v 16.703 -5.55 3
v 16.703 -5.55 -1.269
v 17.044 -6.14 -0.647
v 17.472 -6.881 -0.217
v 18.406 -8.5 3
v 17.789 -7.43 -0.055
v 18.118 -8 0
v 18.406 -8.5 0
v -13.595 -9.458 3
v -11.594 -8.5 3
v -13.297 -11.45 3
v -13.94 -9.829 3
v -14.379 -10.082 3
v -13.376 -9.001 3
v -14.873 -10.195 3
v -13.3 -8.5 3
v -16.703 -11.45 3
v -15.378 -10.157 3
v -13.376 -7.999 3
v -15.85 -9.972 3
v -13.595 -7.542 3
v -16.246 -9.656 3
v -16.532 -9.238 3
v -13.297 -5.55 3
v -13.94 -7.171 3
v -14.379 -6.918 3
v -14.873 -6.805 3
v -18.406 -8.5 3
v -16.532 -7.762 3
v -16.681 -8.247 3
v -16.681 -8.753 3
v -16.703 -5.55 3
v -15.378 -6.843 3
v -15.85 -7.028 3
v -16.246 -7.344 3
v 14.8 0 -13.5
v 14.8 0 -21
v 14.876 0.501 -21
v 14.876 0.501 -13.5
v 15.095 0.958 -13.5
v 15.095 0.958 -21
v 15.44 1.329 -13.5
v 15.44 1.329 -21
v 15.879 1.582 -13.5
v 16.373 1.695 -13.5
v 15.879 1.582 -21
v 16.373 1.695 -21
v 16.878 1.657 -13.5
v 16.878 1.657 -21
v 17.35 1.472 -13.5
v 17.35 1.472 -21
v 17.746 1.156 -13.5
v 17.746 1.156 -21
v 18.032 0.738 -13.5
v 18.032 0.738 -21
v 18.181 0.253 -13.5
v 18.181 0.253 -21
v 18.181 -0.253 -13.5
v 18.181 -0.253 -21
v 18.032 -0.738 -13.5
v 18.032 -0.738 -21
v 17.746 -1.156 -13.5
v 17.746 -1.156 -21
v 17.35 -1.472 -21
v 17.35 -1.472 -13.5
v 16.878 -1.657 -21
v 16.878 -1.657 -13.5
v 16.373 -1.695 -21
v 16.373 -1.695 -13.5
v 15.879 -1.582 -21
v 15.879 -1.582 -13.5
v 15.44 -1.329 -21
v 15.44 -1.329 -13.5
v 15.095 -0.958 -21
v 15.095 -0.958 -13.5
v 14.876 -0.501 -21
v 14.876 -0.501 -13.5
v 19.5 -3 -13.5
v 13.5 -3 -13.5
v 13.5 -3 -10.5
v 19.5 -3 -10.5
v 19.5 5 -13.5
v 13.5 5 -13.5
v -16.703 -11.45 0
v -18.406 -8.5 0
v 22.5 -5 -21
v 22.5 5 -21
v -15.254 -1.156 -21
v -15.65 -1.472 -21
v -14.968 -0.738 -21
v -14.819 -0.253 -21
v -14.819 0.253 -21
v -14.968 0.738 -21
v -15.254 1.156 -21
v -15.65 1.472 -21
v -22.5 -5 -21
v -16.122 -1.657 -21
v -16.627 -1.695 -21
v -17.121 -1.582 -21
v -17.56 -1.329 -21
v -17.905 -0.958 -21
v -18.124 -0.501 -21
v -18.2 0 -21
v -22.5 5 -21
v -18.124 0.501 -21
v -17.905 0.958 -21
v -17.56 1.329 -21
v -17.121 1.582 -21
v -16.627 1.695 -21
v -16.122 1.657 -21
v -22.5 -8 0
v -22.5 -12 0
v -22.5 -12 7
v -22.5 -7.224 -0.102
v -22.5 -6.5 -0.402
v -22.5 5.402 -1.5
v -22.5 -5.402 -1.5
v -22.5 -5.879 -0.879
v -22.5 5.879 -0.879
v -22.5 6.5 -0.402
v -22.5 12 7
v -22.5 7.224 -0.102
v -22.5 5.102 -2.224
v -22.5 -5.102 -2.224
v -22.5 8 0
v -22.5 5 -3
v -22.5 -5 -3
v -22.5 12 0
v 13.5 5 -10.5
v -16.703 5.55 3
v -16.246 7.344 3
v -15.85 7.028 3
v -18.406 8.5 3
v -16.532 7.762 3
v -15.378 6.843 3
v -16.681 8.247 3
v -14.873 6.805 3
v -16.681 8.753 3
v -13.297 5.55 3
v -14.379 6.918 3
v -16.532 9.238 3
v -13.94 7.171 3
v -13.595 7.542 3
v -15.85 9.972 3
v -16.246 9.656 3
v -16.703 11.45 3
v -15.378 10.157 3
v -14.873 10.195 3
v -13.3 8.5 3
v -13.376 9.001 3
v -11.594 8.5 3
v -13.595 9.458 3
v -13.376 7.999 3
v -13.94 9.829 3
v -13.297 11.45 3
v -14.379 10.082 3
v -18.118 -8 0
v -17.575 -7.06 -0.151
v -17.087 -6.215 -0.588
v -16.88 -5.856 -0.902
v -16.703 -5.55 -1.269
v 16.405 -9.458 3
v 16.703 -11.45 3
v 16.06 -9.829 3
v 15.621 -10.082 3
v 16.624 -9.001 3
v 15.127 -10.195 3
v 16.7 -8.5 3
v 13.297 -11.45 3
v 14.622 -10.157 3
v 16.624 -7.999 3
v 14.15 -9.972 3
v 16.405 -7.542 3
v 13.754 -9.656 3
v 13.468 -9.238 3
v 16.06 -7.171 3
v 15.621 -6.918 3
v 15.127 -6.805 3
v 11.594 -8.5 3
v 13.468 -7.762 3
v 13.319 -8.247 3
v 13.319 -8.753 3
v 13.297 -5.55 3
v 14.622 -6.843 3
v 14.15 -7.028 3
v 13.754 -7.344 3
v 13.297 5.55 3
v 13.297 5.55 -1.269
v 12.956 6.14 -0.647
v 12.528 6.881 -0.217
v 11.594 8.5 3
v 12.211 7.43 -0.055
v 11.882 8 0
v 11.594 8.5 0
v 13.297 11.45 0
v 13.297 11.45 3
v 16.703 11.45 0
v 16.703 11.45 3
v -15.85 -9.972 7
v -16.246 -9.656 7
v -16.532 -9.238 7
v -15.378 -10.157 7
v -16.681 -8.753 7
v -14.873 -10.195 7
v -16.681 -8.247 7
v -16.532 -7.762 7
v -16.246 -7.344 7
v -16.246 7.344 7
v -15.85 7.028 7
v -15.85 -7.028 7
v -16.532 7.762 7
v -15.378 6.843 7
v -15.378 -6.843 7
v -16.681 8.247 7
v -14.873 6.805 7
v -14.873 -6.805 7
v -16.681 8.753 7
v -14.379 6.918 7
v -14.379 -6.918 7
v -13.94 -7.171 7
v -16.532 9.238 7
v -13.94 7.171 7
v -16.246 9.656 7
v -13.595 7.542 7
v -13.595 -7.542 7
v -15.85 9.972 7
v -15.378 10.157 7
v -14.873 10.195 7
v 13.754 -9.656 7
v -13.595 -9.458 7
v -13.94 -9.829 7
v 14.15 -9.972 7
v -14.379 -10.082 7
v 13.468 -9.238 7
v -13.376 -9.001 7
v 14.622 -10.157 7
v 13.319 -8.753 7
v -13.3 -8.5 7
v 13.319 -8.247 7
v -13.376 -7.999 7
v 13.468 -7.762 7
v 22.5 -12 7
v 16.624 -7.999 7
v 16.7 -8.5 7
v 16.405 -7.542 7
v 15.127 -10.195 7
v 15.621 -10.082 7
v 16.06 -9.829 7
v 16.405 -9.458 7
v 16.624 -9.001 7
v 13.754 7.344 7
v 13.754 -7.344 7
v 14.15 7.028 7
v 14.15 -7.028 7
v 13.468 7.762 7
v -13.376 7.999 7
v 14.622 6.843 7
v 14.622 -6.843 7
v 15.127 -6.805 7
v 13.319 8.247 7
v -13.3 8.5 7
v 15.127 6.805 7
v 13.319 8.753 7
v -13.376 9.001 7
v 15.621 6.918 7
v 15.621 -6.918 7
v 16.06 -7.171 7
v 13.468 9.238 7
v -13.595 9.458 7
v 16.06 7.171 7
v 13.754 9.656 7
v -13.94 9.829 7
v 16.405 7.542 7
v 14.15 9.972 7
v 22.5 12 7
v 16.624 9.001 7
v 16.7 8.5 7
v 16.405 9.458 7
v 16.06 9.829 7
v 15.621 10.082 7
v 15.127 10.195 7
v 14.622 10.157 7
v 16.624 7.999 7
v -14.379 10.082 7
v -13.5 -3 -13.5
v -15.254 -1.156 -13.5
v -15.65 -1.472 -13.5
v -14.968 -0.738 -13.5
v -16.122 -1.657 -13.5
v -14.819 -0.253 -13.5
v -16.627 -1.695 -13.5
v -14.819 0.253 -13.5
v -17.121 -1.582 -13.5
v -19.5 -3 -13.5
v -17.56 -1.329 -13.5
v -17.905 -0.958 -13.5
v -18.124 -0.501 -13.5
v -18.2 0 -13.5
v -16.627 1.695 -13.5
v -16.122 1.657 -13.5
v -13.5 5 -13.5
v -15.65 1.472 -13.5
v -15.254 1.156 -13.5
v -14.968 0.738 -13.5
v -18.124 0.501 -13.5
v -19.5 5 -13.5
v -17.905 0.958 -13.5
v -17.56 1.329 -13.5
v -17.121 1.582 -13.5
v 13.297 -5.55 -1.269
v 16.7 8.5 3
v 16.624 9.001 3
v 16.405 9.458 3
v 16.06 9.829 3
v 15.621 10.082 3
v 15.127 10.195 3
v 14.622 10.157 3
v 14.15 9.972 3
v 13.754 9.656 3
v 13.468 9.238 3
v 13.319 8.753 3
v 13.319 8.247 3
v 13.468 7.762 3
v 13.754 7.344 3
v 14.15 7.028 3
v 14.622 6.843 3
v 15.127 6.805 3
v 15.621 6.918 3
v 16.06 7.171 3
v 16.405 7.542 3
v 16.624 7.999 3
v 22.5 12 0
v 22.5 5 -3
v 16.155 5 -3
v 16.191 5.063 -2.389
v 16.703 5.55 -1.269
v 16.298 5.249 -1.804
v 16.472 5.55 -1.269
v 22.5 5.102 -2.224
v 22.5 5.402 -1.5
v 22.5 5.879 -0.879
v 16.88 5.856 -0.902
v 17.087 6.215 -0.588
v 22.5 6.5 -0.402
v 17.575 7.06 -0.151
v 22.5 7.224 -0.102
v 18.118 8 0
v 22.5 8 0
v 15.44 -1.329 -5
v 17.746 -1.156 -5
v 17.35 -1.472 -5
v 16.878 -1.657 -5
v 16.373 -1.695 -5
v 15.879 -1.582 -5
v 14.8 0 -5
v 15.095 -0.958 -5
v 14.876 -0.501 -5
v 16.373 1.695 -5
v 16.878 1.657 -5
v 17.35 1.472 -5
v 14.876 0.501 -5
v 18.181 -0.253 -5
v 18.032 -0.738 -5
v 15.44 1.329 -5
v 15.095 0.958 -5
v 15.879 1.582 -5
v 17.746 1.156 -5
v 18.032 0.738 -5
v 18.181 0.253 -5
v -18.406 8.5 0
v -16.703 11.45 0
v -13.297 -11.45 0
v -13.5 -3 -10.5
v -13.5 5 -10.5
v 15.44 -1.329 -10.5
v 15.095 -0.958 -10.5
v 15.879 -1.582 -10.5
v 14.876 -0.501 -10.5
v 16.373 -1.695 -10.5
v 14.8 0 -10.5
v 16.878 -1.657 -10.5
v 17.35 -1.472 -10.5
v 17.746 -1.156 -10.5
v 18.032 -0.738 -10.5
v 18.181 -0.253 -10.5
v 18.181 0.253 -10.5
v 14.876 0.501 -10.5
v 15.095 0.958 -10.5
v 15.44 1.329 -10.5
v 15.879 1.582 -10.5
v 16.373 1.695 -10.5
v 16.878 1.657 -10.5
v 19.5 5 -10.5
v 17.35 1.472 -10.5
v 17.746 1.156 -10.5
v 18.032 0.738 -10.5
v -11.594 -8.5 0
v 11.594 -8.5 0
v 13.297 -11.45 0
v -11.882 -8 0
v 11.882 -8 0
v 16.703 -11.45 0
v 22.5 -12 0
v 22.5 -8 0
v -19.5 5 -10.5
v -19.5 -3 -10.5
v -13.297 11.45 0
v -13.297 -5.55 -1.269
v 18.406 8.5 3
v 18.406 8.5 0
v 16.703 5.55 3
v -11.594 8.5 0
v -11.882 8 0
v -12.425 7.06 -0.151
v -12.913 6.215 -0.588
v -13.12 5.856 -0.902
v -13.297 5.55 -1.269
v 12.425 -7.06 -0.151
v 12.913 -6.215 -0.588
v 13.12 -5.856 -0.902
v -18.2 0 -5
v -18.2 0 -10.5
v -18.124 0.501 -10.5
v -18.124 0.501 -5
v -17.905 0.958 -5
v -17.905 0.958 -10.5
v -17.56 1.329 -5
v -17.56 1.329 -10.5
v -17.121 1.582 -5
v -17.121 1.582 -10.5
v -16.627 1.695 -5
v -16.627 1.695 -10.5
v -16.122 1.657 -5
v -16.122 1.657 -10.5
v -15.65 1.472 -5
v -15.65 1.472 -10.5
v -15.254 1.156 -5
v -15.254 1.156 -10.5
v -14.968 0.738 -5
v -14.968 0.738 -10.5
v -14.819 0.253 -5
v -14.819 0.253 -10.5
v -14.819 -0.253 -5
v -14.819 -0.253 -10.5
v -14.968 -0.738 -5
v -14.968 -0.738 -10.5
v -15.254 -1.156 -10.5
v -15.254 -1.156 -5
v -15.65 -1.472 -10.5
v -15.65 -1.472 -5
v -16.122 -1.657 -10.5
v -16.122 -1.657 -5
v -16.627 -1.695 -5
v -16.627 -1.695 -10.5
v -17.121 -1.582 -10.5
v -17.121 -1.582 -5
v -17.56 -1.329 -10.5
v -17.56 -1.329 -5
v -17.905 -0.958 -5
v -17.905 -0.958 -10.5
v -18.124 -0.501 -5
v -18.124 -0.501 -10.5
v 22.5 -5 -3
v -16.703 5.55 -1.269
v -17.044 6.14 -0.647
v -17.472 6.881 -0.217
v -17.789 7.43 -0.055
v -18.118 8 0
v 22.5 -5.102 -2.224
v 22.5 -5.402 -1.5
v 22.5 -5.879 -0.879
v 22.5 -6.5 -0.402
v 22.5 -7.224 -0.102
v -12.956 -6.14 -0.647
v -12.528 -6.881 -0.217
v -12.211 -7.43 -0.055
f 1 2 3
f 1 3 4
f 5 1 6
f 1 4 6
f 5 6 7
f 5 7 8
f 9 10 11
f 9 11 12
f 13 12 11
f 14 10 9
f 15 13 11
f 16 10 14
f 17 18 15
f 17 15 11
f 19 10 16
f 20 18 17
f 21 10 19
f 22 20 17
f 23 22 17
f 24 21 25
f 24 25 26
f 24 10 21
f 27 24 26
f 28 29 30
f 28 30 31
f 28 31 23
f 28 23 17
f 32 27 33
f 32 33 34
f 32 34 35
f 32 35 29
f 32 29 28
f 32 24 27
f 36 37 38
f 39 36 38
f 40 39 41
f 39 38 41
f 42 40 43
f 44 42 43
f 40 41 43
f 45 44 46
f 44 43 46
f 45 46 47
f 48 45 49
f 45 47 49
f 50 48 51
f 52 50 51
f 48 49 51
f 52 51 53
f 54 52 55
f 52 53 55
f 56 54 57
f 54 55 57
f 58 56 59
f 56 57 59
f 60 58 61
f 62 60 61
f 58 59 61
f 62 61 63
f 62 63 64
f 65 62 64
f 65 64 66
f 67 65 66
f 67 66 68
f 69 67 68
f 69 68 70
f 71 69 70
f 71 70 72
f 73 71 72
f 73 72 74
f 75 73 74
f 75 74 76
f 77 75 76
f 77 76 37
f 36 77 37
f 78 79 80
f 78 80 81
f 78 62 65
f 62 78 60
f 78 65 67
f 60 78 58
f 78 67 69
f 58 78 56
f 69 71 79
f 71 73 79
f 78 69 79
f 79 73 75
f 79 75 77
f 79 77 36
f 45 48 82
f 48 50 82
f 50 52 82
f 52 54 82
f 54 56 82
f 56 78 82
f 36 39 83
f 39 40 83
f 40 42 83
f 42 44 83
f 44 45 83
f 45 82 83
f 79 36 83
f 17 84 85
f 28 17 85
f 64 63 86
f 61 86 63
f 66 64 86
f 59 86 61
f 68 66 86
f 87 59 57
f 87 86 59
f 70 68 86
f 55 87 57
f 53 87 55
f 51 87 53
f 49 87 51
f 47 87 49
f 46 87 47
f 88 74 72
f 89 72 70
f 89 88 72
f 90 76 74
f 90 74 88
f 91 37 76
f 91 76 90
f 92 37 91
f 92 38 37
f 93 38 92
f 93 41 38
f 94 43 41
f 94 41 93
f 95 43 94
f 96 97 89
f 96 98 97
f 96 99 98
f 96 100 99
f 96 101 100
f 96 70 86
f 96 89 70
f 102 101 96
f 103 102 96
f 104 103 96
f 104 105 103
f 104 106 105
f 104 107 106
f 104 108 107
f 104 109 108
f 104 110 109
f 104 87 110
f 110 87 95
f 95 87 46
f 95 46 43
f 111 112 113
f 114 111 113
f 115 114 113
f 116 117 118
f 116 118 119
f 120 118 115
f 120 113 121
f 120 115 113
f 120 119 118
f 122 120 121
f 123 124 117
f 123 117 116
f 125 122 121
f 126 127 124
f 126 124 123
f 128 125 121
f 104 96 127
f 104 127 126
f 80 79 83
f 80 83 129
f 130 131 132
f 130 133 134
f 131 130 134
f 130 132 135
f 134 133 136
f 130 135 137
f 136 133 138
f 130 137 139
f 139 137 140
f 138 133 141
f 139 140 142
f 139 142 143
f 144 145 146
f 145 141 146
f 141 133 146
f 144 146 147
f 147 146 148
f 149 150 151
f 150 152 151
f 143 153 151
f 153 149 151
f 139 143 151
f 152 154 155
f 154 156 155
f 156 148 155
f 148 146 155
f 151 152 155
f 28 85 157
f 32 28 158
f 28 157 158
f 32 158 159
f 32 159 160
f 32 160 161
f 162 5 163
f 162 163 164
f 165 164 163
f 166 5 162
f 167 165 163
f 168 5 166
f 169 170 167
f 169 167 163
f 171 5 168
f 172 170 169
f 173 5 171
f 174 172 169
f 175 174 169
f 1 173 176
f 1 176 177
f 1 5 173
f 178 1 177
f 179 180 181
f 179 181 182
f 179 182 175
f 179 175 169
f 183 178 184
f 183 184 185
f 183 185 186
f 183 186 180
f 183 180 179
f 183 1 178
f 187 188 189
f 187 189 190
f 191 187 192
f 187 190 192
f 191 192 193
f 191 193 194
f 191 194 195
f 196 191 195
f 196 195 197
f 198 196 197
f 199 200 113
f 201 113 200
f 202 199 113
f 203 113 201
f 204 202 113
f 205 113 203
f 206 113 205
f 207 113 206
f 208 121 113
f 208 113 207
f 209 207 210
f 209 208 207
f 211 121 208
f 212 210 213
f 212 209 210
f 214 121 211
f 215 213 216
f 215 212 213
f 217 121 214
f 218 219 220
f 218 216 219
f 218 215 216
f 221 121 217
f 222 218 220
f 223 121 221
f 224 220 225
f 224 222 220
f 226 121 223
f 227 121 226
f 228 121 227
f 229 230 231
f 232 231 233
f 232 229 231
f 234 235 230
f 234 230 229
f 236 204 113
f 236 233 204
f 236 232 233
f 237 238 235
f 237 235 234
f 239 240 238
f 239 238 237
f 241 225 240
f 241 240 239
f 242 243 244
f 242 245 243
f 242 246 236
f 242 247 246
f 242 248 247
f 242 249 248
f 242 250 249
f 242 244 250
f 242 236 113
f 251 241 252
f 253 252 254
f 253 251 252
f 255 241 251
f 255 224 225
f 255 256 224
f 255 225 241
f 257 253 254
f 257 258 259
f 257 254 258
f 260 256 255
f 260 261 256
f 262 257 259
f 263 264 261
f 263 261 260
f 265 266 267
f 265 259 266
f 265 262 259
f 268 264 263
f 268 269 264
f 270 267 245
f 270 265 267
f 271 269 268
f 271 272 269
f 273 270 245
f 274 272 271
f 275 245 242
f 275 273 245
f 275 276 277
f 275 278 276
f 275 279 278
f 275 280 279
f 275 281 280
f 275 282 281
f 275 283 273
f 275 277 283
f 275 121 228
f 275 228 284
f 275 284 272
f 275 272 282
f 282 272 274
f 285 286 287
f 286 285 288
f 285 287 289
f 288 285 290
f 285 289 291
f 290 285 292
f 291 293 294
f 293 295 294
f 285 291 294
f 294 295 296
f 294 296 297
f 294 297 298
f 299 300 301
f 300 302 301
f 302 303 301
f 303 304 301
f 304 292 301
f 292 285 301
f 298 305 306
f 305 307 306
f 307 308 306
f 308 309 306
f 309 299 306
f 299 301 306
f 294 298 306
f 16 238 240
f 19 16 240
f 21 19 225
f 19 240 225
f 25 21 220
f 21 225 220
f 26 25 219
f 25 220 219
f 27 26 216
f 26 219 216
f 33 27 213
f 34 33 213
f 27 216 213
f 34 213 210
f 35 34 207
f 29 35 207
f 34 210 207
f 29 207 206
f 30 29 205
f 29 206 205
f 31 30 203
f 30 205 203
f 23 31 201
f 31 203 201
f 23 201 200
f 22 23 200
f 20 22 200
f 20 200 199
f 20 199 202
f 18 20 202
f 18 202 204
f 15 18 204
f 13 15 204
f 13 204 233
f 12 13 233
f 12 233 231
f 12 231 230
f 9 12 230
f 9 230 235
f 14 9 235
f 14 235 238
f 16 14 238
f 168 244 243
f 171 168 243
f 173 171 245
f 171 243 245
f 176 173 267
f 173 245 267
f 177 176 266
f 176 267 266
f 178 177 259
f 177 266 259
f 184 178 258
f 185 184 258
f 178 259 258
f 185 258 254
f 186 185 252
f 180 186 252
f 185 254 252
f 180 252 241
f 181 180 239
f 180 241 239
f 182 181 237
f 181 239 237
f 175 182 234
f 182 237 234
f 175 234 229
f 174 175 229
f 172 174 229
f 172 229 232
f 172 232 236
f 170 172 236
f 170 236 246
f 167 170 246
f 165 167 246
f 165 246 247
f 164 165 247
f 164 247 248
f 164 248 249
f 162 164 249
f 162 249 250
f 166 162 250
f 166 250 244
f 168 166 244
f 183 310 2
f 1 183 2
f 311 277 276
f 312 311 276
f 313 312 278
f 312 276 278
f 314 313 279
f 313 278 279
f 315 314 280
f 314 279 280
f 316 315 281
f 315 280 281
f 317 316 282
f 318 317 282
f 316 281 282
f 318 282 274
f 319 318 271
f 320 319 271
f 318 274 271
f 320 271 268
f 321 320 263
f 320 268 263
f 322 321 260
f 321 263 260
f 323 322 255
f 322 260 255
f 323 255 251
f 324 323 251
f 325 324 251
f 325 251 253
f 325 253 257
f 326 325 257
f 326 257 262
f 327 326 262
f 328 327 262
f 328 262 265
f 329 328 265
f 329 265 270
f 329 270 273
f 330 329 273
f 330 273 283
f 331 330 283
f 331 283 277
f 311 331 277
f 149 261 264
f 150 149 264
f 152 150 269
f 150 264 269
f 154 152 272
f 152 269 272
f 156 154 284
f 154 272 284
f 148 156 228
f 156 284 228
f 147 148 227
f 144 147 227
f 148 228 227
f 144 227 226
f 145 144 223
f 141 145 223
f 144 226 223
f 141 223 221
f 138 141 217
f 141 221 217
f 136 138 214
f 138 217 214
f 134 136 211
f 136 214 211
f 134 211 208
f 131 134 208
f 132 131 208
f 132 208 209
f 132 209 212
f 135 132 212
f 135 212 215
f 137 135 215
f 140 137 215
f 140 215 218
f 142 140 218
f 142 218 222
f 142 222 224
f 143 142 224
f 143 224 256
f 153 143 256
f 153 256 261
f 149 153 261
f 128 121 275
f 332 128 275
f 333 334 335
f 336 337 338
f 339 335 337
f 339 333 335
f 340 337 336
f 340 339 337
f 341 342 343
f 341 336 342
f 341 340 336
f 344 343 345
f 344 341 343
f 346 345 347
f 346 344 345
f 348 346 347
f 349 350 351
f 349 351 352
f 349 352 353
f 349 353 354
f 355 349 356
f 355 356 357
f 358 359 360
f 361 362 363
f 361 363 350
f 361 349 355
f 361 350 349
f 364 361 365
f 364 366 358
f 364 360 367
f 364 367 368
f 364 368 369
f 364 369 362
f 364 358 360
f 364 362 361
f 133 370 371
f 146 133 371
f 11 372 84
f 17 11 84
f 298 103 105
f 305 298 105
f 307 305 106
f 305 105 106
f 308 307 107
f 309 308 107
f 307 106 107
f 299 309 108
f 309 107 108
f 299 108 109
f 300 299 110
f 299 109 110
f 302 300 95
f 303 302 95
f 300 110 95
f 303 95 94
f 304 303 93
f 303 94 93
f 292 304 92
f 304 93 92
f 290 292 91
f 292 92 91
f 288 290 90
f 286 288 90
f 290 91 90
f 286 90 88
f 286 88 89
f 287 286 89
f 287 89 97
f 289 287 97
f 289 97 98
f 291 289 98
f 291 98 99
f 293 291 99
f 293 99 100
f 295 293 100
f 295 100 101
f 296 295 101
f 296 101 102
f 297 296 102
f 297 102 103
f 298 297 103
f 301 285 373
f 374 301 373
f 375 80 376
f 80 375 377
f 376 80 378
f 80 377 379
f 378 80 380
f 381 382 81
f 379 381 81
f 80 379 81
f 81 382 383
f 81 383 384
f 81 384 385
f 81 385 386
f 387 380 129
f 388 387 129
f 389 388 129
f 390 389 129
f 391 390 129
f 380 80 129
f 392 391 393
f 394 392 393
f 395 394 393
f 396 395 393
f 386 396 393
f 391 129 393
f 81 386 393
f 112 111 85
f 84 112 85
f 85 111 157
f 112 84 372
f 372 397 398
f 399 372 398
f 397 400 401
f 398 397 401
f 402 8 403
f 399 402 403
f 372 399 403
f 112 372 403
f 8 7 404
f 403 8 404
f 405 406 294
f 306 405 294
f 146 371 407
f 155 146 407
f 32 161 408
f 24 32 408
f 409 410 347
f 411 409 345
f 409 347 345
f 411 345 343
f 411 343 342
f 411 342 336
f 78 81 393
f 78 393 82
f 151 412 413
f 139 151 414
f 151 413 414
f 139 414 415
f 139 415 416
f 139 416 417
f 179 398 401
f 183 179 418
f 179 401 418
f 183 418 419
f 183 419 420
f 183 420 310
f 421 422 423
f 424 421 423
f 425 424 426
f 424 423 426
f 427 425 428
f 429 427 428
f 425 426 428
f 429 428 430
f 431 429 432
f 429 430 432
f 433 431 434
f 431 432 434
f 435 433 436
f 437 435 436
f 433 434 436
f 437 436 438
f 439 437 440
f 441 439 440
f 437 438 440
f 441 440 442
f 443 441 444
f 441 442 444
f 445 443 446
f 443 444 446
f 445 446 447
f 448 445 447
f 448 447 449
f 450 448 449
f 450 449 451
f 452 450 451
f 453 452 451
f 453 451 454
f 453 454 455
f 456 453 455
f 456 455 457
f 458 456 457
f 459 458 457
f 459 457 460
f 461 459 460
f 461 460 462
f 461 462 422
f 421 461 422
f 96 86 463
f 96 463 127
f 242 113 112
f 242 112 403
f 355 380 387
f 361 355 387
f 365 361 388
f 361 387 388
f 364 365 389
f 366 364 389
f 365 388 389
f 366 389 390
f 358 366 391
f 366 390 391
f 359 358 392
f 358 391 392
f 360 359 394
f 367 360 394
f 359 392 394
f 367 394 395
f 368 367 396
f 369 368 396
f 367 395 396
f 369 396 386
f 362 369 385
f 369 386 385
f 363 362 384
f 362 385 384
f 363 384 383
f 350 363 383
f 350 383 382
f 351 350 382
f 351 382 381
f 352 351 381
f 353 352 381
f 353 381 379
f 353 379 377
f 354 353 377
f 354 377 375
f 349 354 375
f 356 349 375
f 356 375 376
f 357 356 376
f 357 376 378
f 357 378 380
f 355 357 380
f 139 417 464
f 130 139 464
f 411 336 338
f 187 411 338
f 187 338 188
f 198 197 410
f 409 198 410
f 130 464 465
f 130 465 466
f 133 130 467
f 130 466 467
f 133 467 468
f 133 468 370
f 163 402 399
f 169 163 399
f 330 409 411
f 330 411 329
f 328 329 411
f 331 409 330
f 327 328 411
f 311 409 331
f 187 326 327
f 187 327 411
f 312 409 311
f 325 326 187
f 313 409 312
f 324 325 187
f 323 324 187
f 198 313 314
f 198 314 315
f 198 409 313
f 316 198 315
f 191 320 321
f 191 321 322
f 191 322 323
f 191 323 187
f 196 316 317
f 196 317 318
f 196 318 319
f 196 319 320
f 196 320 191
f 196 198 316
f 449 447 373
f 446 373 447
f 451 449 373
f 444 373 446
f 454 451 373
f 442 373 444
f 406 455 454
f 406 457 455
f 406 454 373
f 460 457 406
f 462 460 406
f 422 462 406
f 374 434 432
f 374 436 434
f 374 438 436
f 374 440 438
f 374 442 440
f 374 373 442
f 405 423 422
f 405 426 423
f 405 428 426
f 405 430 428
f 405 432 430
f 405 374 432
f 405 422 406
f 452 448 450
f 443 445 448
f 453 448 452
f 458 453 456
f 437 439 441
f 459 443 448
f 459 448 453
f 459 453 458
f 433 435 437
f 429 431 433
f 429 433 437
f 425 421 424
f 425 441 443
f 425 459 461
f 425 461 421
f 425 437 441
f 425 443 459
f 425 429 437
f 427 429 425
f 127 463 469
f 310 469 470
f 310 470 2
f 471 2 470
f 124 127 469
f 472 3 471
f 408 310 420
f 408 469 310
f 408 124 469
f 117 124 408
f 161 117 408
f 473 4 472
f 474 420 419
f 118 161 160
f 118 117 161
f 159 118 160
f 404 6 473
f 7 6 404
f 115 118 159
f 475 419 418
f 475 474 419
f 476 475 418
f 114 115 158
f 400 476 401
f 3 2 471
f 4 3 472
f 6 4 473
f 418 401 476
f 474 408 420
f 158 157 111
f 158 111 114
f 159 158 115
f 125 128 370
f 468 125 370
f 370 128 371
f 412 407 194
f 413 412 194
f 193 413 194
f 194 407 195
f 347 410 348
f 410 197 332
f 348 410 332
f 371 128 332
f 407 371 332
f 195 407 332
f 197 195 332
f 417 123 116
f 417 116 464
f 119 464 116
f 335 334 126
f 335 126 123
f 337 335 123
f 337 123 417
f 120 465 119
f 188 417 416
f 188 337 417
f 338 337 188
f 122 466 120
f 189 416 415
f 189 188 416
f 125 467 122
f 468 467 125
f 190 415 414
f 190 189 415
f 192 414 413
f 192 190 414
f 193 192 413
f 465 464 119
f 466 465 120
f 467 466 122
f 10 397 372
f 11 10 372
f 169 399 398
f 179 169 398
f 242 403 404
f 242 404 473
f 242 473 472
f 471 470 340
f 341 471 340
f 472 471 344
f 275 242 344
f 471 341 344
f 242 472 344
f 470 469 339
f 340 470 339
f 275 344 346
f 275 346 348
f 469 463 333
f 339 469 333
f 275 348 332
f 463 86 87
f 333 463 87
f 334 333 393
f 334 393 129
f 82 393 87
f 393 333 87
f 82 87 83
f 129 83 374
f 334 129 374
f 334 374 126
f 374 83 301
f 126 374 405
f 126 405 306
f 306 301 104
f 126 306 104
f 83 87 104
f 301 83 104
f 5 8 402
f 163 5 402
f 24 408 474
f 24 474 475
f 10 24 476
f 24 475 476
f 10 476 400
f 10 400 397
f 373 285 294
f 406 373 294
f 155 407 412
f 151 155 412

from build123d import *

# Parameters (mm, degrees)
SKETCH_1_W          = 45
SKETCH_1_H          = 20
EXTRUDE_1_DEPTH     = 10
EXTRUDE_2_DEPTH     = 17
SKETCH_3_W          = 45
SKETCH_3_H          = 2
EXTRUDE_3_DEPTH     = 10
SKETCH_5_R          = 1.5
CUT_EXTRUDE_1_DEPTH = 31.647185841
CUT_EXTRUDE_3_DEPTH = 3
FILLET_4_R          = 3
FILLET_5_R          = 3
SKETCH_9_W          = 45
SKETCH_9_H          = 24
CUT_EXTRUDE_4_DEPTH = 3
SKETCH_10_W         = 45
SKETCH_10_H         = 10
EXTRUDE_4_DEPTH     = 3
SKETCH_12_R         = 1.55
CUT_EXTRUDE_5_DEPTH = 15
CUT_EXTRUDE_6_DEPTH = 8
EXTRUDE_START       = 1
SKETCH_15_W         = 45
SKETCH_15_H         = 10
SKETCH_15_R         = 1.55
EXTRUDE_5_DEPTH     = 1
SKETCH_16_R         = 1.7
CUT_EXTRUDE_7_DEPTH = 38.871493237
CUT_EXTRUDE_8_DEPTH = 24
CUT_EXTRUDE_9_REACH = 39.871
SKETCH_18_R         = 1.7


with BuildPart() as part:
    # Эскиз1 → Бобышка-Вытянуть1 (new body)
    with BuildSketch(Plane.XY):
        Rectangle(SKETCH_1_W, SKETCH_1_H)
    extrude(amount=EXTRUDE_1_DEPTH)

    # Эскиз2 → Бобышка-Вытянуть2 (add)
    with BuildSketch(Plane(origin=(0, 0, 0), x_dir=(-1, 0, 0), z_dir=(0, 0, -1))):
        Polygon((-22.5, 0), (-22.5, 5), (22.5, 5), (22.5, -5), (-22.5, -5), align=None)
    extrude(amount=EXTRUDE_2_DEPTH)

    # Эскиз3 → Бобышка-Вытянуть3 (add)
    with BuildSketch(Plane.XY.offset(10)):
        with Locations((0, 11)):
            Rectangle(SKETCH_3_W, SKETCH_3_H)
        with Locations((0, -11)):
            Rectangle(SKETCH_3_W, SKETCH_3_H)
    extrude(amount=-EXTRUDE_3_DEPTH)

    # Эскиз5 → Вырез-Вытянуть1 (cut, through all)
    with BuildSketch(Plane(origin=(0, 0, 0), x_dir=(-1, 0, 0), z_dir=(0, 0, -1))):
        with Locations((-15, 8.5)):
            Circle(SKETCH_5_R)
        with Locations((15, 8.5)):
            Circle(SKETCH_5_R)
        with Locations((15, -8.5)):
            Circle(SKETCH_5_R)
        with Locations((-15, -8.5)):
            Circle(SKETCH_5_R)
    extrude(amount=-CUT_EXTRUDE_1_DEPTH, mode=Mode.SUBTRACT)

    # Эскиз8 → Вырез-Вытянуть3 (cut)
    with BuildSketch(Plane(origin=(0, 0, 0), x_dir=(-1, 0, 0), z_dir=(0, 0, -1))):
        Polygon((-11.824573519, 8.5), (-13.41228676, 11.25), (-16.58771324, 11.25), (-18.175426481, 8.5), (-16.58771324, 5.75), (-13.41228676, 5.75), align=None)
        Polygon((-13.41228676, -5.75), (-11.824573519, -8.5), (-13.41228676, -11.25), (-16.58771324, -11.25), (-18.175426481, -8.5), (-16.58771324, -5.75), align=None)
        Polygon((11.824573519, -8.5), (13.41228676, -11.25), (16.58771324, -11.25), (18.175426481, -8.5), (16.58771324, -5.75), (13.41228676, -5.75), align=None)
        Polygon((13.41228676, 5.75), (11.824573519, 8.5), (13.41228676, 11.25), (16.58771324, 11.25), (18.175426481, 8.5), (16.58771324, 5.75), align=None)
    extrude(amount=-CUT_EXTRUDE_3_DEPTH, mode=Mode.SUBTRACT)

    # Скругление4
    # the kernel refuses this fillet: 3 mm, written as the material it adds along each edge
    with BuildSketch(Plane(origin=(22.5, 5, 0), x_dir=(0, 1, 0), z_dir=(-1, 0, 0))) as fillet_4_piece_1_section:
        with BuildLine():
            CenterArc((FILLET_4_R, FILLET_4_R), FILLET_4_R, 180, 90)
            Line((0, FILLET_4_R), (0, 0))
            Line((0, 0), (FILLET_4_R, 0))
        make_face()
    fillet_4_piece_1 = extrude(amount=52.5, mode=Mode.PRIVATE)
    fillet_4_piece_1 = split(fillet_4_piece_1, bisect_by=Plane(origin=(17.590792641, 7.487384486, -0.29904688), z_dir=(0.866025403784439, -0.49999999999999944, 0)), keep=Keep.TOP, mode=Mode.PRIVATE)
    add(fillet_4_piece_1)
    with BuildSketch(Plane(origin=(30, 5, 0), x_dir=(0, 1, 0), z_dir=(-1, 0, 0))) as fillet_4_piece_2_section:
        with BuildLine():
            CenterArc((FILLET_4_R, FILLET_4_R), FILLET_4_R, 180, 90)
            Line((0, FILLET_4_R), (0, 0))
            Line((0, 0), (FILLET_4_R, 0))
        make_face()
    fillet_4_piece_2 = extrude(amount=52.5, mode=Mode.PRIVATE)
    fillet_4_piece_2 = split(fillet_4_piece_2, bisect_by=Plane(origin=(16.011289033, 4.751603986, -0.863215568), z_dir=(-0.866025403784439, 0.49999999999999944, 0)), keep=Keep.TOP, mode=Mode.PRIVATE)
    fillet_4_piece_2 = split(fillet_4_piece_2, bisect_by=Plane(origin=(15, 5.75, -0.863215568), z_dir=(0, -1, 0)), keep=Keep.TOP, mode=Mode.PRIVATE)
    add(fillet_4_piece_2)
    with BuildSketch(Plane(origin=(30, 5, 0), x_dir=(0, 1, 0), z_dir=(-1, 0, 0))) as fillet_4_piece_3_section:
        with BuildLine():
            CenterArc((FILLET_4_R, FILLET_4_R), FILLET_4_R, 180, 90)
            Line((0, FILLET_4_R), (0, 0))
            Line((0, 0), (FILLET_4_R, 0))
        make_face()
    fillet_4_piece_3 = extrude(amount=60, mode=Mode.PRIVATE)
    fillet_4_piece_3 = split(fillet_4_piece_3, bisect_by=Plane(origin=(9.828179478, 11.957855912, -0.295719997), z_dir=(-0.8660254037844385, -0.5000000000000003, 0)), keep=Keep.TOP, mode=Mode.PRIVATE)
    fillet_4_piece_3 = split(fillet_4_piece_3, bisect_by=Plane(origin=(-9.828179478, 11.957855912, -0.295719997), z_dir=(0.8660254037844385, -0.5000000000000003, 0)), keep=Keep.TOP, mode=Mode.PRIVATE)
    add(fillet_4_piece_3)
    with BuildSketch(Plane(origin=(30, 5, 0), x_dir=(0, 1, 0), z_dir=(-1, 0, 0))) as fillet_4_piece_4_section:
        with BuildLine():
            CenterArc((FILLET_4_R, FILLET_4_R), FILLET_4_R, 180, 90)
            Line((0, FILLET_4_R), (0, 0))
            Line((0, 0), (FILLET_4_R, 0))
        make_face()
    fillet_4_piece_4 = extrude(amount=52.5, mode=Mode.PRIVATE)
    fillet_4_piece_4 = split(fillet_4_piece_4, bisect_by=Plane(origin=(-17.590792641, 7.487384486, -0.29904688), z_dir=(-0.866025403784439, -0.49999999999999944, 0)), keep=Keep.TOP, mode=Mode.PRIVATE)
    add(fillet_4_piece_4)

    # Скругление5
    # the kernel refuses this fillet: 3 mm, written as the material it adds along each edge
    with BuildSketch(Plane(origin=(-22.5, -5, 0), x_dir=(0, 0, -1), z_dir=(1, 0, 0))) as fillet_5_piece_1_section:
        with BuildLine():
            CenterArc((FILLET_5_R, -FILLET_5_R), FILLET_5_R, 90, 90)
            Line((0, -FILLET_5_R), (0, 0))
            Line((0, 0), (FILLET_5_R, 0))
        make_face()
    fillet_5_piece_1 = extrude(amount=45, mode=Mode.PRIVATE)
    fillet_5_piece_1 = split(fillet_5_piece_1, bisect_by=Plane(origin=(-19.417241341, -5.75, -0.889716038), z_dir=(0, 1, 0)), keep=Keep.TOP, mode=Mode.PRIVATE)
    add(fillet_5_piece_1)
    with BuildSketch(Plane(origin=(-22.5, -5, 0), x_dir=(0, 0, -1), z_dir=(1, 0, 0))) as fillet_5_piece_2_section:
        with BuildLine():
            CenterArc((FILLET_5_R, -FILLET_5_R), FILLET_5_R, 90, 90)
            Line((0, -FILLET_5_R), (0, 0))
            Line((0, 0), (FILLET_5_R, 0))
        make_face()
    fillet_5_piece_2 = extrude(amount=52.5, mode=Mode.PRIVATE)
    fillet_5_piece_2 = split(fillet_5_piece_2, bisect_by=Plane(origin=(-17.590792641, -7.487384486, -0.29904688), z_dir=(-0.866025403784439, 0.49999999999999944, 0)), keep=Keep.TOP, mode=Mode.PRIVATE)
    add(fillet_5_piece_2)
    with BuildSketch(Plane(origin=(-30, -5, 0), x_dir=(0, 0, -1), z_dir=(1, 0, 0))) as fillet_5_piece_3_section:
        with BuildLine():
            CenterArc((FILLET_5_R, -FILLET_5_R), FILLET_5_R, 90, 90)
            Line((0, -FILLET_5_R), (0, 0))
            Line((0, 0), (FILLET_5_R, 0))
        make_face()
    fillet_5_piece_3 = extrude(amount=60, mode=Mode.PRIVATE)
    fillet_5_piece_3 = split(fillet_5_piece_3, bisect_by=Plane(origin=(-9.828179478, -11.957855912, -0.295719997), z_dir=(0.8660254037844385, 0.5000000000000003, 0)), keep=Keep.TOP, mode=Mode.PRIVATE)
    fillet_5_piece_3 = split(fillet_5_piece_3, bisect_by=Plane(origin=(9.828179478, -11.957855912, -0.295719997), z_dir=(-0.8660254037844385, 0.5000000000000003, 0)), keep=Keep.TOP, mode=Mode.PRIVATE)
    add(fillet_5_piece_3)
    with BuildSketch(Plane(origin=(-30, -5, 0), x_dir=(0, 0, -1), z_dir=(1, 0, 0))) as fillet_5_piece_4_section:
        with BuildLine():
            CenterArc((FILLET_5_R, -FILLET_5_R), FILLET_5_R, 90, 90)
            Line((0, -FILLET_5_R), (0, 0))
            Line((0, 0), (FILLET_5_R, 0))
        make_face()
    fillet_5_piece_4 = extrude(amount=52.5, mode=Mode.PRIVATE)
    fillet_5_piece_4 = split(fillet_5_piece_4, bisect_by=Plane(origin=(17.590792641, -7.487384486, -0.29904688), z_dir=(0.866025403784439, 0.49999999999999944, 0)), keep=Keep.TOP, mode=Mode.PRIVATE)
    add(fillet_5_piece_4)

    # Эскиз9 → Вырез-Вытянуть4 (cut)
    with BuildSketch(Plane.XY.offset(10)):
        Rectangle(SKETCH_9_W, SKETCH_9_H)
    extrude(amount=-CUT_EXTRUDE_4_DEPTH, mode=Mode.SUBTRACT)

    # Эскиз10 → Бобышка-Вытянуть4 (add)
    with BuildSketch(Plane(origin=(0, 0, -17), x_dir=(-1, 0, 0), z_dir=(0, 0, -1))):
        Rectangle(SKETCH_10_W, SKETCH_10_H)
    extrude(amount=EXTRUDE_4_DEPTH)

    # Эскиз12 → Вырез-Вытянуть5 (cut)
    with BuildSketch(Plane(origin=(0, 0, -20), x_dir=(-1, 0, 0), z_dir=(0, 0, -1))):
        with Locations((-16.5, 0)):
            Circle(SKETCH_12_R)
        with Locations((16.5, 0)):
            Circle(SKETCH_12_R)
    extrude(amount=-CUT_EXTRUDE_5_DEPTH, mode=Mode.SUBTRACT)

    # Эскиз13 → Вырез-Вытянуть6 (cut)
    with BuildSketch(Plane(origin=(0, 5, 0), x_dir=(1, 0, 0), z_dir=(0, 1, 0))):
        Polygon((16.5, 13.5), (13.5, 13.5), (13.5, 10.5), (19.5, 10.5), (19.5, 13.5), align=None)
        Polygon((-19.5, 13.5), (-16.5, 13.5), (-13.5, 13.5), (-13.5, 10.5), (-19.5, 10.5), align=None)
    extrude(amount=-CUT_EXTRUDE_6_DEPTH, mode=Mode.SUBTRACT)

    # Эскиз15 → Бобышка-Вытянуть5 (add)
    with BuildSketch(Plane(origin=(0, 0, -20), x_dir=(-1, 0, 0), z_dir=(0, 0, -1)).offset(EXTRUDE_START)):
        Rectangle(SKETCH_15_W, SKETCH_15_H)
        with Locations((-16.5, 0)):
            Circle(SKETCH_15_R, mode=Mode.SUBTRACT)
        with Locations((16.5, 0)):
            Circle(SKETCH_15_R, mode=Mode.SUBTRACT)
    extrude(amount=-EXTRUDE_5_DEPTH)

    # Эскиз16 → Вырез-Вытянуть7 (cut, through all)
    with BuildSketch(Plane.XY.offset(7)):
        with Locations((15, -8.5)):
            Circle(SKETCH_16_R)
        with Locations((-15, -8.5)):
            Circle(SKETCH_16_R)
        with Locations((-15, 8.5)):
            Circle(SKETCH_16_R)
        with Locations((15, 8.5)):
            Circle(SKETCH_16_R)
    extrude(amount=-CUT_EXTRUDE_7_DEPTH, mode=Mode.SUBTRACT)

    # Эскиз17 → Вырез-Вытянуть8 (cut)
    with BuildSketch(Plane(origin=(0, 0, -21), x_dir=(-1, 0, 0), z_dir=(0, 0, -1))):
        Polygon((-13.296816706, 5.55), (-11.593633412, 8.5), (-13.296816706, 11.45), (-16.703183294, 11.45), (-18.406366588, 8.5), (-16.703183294, 5.55), align=None)
        Polygon((16.703183294, 5.55), (18.406366588, 8.5), (16.703183294, 11.45), (13.296816706, 11.45), (11.593633412, 8.5), (13.296816706, 5.55), align=None)
        Polygon((16.703183294, -11.45), (18.406366588, -8.5), (16.703183294, -5.55), (13.296816706, -5.55), (11.593633412, -8.5), (13.296816706, -11.45), align=None)
        Polygon((-13.296816706, -11.45), (-11.593633412, -8.5), (-13.296816706, -5.55), (-16.703183294, -5.55), (-18.406366588, -8.5), (-16.703183294, -11.45), align=None)
    extrude(amount=-CUT_EXTRUDE_8_DEPTH, mode=Mode.SUBTRACT)

    # Вырез-Вытянуть9: up to this face of the body (flat: up to its plane)
    cut_extrude_9_end = Plane(part.part.faces().sort_by_distance((16.5, 0, -5))[0])
    # Эскиз18 → Вырез-Вытянуть9 (cut, up to the picked face)
    with BuildSketch(Plane(origin=(0, 0, -21), x_dir=(-1, 0, 0), z_dir=(0, 0, -1)), mode=Mode.PRIVATE) as cut_extrude_9_sk1:
        with Locations((-16.5, 0)):
            Circle(SKETCH_18_R)
    cut_extrude_9_tool1 = split(extrude(cut_extrude_9_sk1.sketch, amount=-CUT_EXTRUDE_9_REACH, mode=Mode.PRIVATE), bisect_by=cut_extrude_9_end, keep=Keep.BOTH, mode=Mode.PRIVATE)
    # Эскиз18 → Вырез-Вытянуть9 (cut, up to the picked face)
    with BuildSketch(Plane(origin=(0, 0, -21), x_dir=(-1, 0, 0), z_dir=(0, 0, -1)), mode=Mode.PRIVATE) as cut_extrude_9_sk2:
        with Locations((16.5, 0)):
            Circle(SKETCH_18_R)
    cut_extrude_9_tool2 = split(extrude(cut_extrude_9_sk2.sketch, amount=-CUT_EXTRUDE_9_REACH, mode=Mode.PRIVATE), bisect_by=cut_extrude_9_end, keep=Keep.BOTH, mode=Mode.PRIVATE)
    add(cut_extrude_9_tool1.solids().sort_by(Axis((16.5, 0, -21), (0, 0, 1)))[0], mode=Mode.SUBTRACT)
    add(cut_extrude_9_tool2.solids().sort_by(Axis((-16.5, 0, -21), (0, 0, 1)))[0], mode=Mode.SUBTRACT)


solid = part.part
